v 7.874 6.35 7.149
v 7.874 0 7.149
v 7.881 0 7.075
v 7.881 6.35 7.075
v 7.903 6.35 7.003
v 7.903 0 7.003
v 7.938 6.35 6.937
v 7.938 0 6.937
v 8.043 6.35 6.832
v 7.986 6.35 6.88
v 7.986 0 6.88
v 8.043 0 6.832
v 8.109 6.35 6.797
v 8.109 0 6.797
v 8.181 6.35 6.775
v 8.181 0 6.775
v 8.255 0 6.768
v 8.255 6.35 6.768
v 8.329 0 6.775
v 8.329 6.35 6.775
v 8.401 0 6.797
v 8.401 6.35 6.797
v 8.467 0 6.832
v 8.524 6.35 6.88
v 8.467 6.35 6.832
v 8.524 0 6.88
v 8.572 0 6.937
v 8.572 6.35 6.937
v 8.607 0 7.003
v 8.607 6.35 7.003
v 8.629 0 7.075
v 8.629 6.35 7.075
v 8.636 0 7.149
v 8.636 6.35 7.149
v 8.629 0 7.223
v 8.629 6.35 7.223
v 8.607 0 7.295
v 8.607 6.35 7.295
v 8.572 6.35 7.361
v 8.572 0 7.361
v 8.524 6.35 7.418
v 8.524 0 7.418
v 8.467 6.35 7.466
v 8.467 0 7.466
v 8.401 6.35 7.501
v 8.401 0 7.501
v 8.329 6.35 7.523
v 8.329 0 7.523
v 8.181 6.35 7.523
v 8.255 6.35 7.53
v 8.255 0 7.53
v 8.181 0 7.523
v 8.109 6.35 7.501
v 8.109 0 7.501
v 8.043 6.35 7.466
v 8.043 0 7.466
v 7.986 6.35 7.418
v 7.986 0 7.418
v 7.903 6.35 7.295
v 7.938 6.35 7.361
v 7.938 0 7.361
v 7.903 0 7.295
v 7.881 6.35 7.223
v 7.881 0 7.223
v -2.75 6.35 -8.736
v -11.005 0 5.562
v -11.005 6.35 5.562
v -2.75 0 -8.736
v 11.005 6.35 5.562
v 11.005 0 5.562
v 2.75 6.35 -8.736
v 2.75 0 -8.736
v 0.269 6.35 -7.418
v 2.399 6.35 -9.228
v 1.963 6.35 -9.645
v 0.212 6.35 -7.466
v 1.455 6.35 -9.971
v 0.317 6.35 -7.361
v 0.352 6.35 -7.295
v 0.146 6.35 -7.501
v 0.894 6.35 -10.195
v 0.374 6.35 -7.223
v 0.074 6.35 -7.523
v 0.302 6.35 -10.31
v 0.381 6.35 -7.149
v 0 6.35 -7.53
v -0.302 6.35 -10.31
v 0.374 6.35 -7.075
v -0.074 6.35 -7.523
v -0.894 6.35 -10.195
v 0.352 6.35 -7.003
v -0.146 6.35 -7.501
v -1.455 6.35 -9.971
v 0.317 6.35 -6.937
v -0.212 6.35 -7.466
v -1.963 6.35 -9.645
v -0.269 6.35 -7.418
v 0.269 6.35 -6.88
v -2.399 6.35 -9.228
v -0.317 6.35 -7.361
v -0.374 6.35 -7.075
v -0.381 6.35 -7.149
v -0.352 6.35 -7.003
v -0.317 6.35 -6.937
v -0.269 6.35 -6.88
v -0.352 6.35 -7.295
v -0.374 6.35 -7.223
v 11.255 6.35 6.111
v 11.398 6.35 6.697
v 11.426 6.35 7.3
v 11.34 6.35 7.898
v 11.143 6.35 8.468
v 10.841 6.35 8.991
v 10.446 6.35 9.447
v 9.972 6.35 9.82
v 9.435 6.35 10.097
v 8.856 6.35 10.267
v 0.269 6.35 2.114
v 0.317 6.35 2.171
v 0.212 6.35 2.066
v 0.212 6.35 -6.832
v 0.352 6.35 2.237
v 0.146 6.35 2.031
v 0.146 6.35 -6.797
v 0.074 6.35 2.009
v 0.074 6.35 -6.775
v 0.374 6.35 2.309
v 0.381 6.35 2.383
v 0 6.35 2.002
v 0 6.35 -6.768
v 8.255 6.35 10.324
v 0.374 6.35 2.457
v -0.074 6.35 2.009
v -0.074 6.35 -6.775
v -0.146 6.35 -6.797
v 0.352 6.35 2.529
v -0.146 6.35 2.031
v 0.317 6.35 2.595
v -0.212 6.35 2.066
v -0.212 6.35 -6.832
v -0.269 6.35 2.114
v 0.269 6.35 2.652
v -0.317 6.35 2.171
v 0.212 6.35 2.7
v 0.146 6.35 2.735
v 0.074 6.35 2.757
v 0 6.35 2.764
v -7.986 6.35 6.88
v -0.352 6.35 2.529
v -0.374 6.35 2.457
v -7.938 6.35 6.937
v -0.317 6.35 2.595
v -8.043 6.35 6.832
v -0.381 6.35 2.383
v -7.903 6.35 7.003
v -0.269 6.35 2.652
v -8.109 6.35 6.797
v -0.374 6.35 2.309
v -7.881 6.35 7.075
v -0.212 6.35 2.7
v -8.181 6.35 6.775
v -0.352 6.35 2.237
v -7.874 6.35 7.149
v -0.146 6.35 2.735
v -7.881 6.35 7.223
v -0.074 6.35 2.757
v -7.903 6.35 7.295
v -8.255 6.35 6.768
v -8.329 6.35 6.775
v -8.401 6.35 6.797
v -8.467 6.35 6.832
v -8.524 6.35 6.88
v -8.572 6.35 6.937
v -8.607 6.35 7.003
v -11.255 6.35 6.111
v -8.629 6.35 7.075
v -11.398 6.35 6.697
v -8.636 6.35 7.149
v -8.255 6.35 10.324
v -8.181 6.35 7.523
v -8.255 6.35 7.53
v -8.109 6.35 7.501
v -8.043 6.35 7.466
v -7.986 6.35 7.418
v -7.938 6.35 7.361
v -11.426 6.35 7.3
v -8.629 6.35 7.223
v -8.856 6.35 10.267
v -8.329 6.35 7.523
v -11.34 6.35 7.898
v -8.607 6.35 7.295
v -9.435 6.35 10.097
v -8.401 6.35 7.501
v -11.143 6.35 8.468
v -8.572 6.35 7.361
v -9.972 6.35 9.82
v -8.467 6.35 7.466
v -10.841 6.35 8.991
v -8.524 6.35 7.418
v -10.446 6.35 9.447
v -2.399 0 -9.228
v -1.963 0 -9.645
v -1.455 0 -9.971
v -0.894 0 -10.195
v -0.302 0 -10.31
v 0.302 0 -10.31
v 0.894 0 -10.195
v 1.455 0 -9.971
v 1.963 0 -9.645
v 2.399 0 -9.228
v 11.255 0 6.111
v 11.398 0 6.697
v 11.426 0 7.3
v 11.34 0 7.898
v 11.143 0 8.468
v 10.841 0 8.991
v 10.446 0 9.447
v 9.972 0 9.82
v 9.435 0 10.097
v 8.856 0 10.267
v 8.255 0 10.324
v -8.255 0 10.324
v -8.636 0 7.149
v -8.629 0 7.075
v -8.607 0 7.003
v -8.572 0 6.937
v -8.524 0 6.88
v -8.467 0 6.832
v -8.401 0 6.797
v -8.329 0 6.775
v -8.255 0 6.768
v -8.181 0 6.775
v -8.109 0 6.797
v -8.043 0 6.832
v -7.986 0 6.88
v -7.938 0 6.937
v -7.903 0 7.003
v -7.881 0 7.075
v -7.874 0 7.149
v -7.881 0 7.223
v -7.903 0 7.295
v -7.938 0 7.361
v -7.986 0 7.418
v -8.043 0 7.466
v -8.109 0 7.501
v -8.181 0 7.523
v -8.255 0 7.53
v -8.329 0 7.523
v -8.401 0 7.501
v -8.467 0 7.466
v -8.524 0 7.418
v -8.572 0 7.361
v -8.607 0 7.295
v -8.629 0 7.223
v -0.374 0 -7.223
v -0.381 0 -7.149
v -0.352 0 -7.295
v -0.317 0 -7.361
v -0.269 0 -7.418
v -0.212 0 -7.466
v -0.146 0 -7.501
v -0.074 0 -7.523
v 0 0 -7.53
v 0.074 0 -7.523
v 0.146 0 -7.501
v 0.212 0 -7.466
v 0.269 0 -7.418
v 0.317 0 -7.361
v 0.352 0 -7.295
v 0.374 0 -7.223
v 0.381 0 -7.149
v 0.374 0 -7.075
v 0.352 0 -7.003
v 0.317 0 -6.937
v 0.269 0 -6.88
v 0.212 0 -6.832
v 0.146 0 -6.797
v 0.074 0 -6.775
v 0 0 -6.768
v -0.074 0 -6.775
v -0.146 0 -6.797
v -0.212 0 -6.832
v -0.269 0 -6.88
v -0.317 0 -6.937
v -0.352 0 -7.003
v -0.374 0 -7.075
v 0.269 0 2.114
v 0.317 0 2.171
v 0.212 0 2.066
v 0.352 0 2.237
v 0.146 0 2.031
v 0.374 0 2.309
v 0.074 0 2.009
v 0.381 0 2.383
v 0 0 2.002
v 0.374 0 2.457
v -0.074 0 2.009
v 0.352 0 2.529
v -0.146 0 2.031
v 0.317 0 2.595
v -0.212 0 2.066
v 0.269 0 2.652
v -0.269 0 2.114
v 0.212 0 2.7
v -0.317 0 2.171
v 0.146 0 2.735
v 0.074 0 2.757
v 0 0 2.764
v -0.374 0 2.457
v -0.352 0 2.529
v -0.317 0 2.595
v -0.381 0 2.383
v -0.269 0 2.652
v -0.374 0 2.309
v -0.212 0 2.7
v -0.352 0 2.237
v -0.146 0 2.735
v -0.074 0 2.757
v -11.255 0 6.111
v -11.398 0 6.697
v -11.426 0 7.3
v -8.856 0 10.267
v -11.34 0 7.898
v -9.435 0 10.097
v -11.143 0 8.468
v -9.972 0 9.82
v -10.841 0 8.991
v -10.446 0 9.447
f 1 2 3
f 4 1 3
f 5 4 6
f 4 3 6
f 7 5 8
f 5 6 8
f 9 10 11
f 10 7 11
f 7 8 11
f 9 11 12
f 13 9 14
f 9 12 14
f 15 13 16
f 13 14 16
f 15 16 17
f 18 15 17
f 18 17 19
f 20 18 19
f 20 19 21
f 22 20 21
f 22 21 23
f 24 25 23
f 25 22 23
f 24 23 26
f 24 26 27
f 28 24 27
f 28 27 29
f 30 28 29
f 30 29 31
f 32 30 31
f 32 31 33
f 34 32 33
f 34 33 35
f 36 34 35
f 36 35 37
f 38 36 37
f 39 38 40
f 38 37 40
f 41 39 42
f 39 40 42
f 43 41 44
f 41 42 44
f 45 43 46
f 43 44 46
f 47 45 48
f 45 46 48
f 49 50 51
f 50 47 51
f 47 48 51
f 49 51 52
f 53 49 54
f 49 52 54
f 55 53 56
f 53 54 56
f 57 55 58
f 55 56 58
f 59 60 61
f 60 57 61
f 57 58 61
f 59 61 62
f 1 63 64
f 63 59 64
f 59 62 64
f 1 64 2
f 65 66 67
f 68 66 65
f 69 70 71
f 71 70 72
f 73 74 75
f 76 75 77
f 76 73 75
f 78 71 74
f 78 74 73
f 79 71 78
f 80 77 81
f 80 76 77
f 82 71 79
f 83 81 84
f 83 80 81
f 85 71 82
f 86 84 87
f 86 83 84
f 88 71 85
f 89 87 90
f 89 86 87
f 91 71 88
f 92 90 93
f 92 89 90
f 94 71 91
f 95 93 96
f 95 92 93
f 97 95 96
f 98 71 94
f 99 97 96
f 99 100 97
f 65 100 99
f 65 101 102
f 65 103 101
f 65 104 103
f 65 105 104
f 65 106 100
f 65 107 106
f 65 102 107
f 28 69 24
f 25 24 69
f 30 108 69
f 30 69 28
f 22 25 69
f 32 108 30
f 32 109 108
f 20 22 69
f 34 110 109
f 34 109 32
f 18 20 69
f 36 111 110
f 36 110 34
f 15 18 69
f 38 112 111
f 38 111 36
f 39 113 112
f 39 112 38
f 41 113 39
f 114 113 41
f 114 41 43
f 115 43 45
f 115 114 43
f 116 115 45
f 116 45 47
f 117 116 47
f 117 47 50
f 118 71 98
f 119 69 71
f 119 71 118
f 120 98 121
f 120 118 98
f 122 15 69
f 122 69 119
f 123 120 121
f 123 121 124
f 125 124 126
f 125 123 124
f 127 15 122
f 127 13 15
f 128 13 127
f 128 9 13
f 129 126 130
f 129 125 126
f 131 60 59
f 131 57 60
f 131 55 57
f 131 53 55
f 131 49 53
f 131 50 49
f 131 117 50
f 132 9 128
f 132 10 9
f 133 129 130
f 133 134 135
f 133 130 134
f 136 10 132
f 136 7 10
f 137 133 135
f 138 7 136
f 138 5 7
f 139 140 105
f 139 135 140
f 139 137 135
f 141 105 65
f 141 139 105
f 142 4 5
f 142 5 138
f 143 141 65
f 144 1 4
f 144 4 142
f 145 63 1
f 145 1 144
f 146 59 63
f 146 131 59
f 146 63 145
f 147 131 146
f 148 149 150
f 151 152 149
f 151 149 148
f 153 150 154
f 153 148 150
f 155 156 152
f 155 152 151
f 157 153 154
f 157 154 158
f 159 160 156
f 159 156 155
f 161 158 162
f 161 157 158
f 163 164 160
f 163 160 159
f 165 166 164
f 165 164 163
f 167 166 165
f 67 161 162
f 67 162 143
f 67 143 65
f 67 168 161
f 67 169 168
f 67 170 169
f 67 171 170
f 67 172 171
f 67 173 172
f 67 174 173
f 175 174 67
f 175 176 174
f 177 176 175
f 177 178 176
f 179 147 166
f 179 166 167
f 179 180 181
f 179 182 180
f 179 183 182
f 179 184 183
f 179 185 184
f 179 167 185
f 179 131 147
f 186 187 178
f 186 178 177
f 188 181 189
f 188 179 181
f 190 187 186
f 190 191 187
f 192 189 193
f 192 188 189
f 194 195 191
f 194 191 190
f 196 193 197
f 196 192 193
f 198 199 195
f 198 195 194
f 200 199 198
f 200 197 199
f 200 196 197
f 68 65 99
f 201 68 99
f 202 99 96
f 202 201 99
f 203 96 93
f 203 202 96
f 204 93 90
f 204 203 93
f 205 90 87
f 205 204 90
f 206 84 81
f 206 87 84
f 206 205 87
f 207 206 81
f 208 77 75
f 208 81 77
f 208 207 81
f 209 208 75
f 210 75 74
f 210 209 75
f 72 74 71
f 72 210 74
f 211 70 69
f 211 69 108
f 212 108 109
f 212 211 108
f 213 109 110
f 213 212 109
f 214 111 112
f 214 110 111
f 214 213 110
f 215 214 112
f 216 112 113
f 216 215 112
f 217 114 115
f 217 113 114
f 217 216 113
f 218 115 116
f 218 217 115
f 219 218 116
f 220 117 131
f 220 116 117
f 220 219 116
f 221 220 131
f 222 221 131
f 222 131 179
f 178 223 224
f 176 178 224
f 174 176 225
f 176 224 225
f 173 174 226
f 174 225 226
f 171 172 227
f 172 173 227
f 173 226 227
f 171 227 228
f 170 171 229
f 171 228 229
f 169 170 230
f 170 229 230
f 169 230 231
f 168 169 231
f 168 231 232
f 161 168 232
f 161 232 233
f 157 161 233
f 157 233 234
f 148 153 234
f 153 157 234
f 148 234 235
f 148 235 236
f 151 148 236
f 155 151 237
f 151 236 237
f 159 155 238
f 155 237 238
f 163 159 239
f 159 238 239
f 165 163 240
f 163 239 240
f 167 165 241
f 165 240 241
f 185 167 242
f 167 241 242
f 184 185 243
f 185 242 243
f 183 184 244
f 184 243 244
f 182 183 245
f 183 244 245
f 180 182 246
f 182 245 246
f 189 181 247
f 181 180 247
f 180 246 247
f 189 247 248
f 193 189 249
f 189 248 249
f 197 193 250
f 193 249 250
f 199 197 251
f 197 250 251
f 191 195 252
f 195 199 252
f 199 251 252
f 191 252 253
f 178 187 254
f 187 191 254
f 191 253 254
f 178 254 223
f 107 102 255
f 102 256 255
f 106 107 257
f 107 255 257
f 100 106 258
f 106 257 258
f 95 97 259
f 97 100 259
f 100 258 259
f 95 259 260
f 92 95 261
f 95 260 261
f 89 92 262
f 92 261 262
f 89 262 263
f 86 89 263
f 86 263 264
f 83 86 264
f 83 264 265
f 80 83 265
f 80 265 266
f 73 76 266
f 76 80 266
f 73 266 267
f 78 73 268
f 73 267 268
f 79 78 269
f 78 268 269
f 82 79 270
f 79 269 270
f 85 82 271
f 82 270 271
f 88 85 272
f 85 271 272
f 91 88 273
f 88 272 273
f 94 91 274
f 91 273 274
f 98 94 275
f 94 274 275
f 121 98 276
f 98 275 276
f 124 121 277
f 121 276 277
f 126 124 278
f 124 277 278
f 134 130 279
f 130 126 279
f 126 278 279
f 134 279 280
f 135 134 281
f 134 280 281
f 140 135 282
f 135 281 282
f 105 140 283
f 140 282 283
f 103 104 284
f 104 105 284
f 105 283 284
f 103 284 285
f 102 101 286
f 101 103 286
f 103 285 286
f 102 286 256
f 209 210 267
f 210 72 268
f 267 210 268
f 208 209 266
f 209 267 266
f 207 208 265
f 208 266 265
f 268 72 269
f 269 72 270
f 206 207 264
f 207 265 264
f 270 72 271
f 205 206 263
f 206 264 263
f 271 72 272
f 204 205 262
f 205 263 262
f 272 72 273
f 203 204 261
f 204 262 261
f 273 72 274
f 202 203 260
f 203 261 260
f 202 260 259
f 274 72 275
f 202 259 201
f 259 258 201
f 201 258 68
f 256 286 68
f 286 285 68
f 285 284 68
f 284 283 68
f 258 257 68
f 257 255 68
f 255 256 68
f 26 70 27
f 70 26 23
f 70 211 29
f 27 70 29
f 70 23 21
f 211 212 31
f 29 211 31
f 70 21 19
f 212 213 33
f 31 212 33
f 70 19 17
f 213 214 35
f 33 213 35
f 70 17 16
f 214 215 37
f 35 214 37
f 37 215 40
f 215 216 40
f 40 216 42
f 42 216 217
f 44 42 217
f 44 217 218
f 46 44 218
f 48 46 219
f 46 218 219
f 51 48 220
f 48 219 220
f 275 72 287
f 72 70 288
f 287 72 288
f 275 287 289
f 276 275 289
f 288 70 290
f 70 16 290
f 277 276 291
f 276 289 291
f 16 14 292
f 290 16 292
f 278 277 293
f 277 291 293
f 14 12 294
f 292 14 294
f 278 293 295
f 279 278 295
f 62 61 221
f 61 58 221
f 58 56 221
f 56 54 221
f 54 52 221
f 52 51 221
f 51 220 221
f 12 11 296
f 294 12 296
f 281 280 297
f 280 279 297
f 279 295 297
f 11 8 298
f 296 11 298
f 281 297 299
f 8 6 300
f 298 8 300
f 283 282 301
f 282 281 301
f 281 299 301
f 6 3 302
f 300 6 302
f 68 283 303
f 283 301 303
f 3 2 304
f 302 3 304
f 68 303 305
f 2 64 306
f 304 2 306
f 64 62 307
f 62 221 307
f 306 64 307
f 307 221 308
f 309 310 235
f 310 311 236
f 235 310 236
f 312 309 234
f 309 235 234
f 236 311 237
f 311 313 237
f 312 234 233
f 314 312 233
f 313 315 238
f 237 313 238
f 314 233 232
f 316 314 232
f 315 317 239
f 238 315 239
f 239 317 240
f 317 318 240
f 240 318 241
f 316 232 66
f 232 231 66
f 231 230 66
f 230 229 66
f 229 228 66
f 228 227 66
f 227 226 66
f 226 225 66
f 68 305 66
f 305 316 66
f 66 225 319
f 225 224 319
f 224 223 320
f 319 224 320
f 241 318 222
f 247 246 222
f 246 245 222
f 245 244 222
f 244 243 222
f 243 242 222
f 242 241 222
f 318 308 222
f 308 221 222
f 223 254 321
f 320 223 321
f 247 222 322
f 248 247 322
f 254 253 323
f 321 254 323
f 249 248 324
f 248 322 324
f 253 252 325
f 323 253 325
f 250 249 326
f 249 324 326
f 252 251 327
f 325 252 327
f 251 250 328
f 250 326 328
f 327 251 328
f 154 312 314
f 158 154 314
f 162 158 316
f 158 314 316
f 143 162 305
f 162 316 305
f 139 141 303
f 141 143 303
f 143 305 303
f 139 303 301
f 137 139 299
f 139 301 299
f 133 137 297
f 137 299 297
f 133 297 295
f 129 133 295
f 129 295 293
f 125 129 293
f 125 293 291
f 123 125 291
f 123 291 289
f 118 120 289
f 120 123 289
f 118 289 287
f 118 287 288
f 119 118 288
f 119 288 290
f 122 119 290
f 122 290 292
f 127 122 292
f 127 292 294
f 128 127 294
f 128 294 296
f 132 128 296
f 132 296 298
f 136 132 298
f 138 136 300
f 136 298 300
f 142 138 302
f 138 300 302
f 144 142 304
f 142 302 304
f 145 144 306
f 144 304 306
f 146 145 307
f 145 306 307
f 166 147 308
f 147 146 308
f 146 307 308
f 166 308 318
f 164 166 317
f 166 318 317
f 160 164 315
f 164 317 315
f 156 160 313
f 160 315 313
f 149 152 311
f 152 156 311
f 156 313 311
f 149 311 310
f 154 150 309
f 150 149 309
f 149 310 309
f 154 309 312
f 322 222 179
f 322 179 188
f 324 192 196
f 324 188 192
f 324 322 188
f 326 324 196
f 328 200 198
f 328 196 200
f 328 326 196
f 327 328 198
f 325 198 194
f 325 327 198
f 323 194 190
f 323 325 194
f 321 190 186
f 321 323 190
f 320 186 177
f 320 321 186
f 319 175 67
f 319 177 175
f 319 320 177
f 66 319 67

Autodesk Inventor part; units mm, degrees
ref_plane "YZ Plane" through (0, 0, 0) normal (1, 0, 0) x (0, 1, 0)
ref_plane "XZ Plane" through (0, 0, 0) normal (0, 1, 0) x (-1, 0, 0)
ref_plane "XY Plane" through (0, 0, 0) normal (0, 0, 1) x (1, 0, 0)
sketch "Sketch1" plane through (0, 0, 0) normal (0, 1, 0) x (-1, 0, 0)
  line L0 (-8.255, 7.149) -> (8.255, 7.149) construction
  line L1 (8.255, 7.149) -> (0, -7.149) construction
  line L2 (0, -7.149) -> (-8.255, 7.149) construction
  line L3 (0, -7.149) -> (0, 7.149) construction
  circle A0 centre (-8.255, 7.149) radius 1.524 construction
  circle A1 centre (8.255, 7.149) radius 1.524 construction
  circle A2 centre (0, -7.149) radius 1.524 construction
  circle A3 centre (-8.255, 7.149) radius 0.381
  circle A4 centre (8.255, 7.149) radius 0.381
  circle A5 centre (0, -7.149) radius 0.381
  line L4 (-8.255, 10.324) -> (8.255, 10.324)
  line L5 (-11.0046, 5.5615) -> (-2.7496, -8.7365)
  line L6 (11.0046, 5.5615) -> (2.7496, -8.7365)
  arc A6 (-8.255, 10.324) -> (-11.0046, 5.5615) centre (-8.255, 7.149) ccw
  arc A7 (11.0046, 5.5615) -> (8.255, 10.324) centre (8.255, 7.149) ccw
  arc A8 (-2.7496, -8.7365) -> (2.7496, -8.7365) centre (0, -7.149) ccw
  line L7 (8.255, 7.149) -> (-4.1275, 0) construction
  line L8 (-8.255, 7.149) -> (4.1275, 0) construction
  circle A9 centre (0, 2.383) radius 0.381
  point P0 (0, 0)
  point P1 (0, 0)
  dimension "d1" = 16.51
  dimension "d2" = 3.048
  dimension "d3" = 0.762
  dimension "d4" = 3.175
  dimension "d5" = 0.762
extrude "Extrusion1" add sketch "Sketch1" along normal blind 6.35
properties part number "RollerMounter"
